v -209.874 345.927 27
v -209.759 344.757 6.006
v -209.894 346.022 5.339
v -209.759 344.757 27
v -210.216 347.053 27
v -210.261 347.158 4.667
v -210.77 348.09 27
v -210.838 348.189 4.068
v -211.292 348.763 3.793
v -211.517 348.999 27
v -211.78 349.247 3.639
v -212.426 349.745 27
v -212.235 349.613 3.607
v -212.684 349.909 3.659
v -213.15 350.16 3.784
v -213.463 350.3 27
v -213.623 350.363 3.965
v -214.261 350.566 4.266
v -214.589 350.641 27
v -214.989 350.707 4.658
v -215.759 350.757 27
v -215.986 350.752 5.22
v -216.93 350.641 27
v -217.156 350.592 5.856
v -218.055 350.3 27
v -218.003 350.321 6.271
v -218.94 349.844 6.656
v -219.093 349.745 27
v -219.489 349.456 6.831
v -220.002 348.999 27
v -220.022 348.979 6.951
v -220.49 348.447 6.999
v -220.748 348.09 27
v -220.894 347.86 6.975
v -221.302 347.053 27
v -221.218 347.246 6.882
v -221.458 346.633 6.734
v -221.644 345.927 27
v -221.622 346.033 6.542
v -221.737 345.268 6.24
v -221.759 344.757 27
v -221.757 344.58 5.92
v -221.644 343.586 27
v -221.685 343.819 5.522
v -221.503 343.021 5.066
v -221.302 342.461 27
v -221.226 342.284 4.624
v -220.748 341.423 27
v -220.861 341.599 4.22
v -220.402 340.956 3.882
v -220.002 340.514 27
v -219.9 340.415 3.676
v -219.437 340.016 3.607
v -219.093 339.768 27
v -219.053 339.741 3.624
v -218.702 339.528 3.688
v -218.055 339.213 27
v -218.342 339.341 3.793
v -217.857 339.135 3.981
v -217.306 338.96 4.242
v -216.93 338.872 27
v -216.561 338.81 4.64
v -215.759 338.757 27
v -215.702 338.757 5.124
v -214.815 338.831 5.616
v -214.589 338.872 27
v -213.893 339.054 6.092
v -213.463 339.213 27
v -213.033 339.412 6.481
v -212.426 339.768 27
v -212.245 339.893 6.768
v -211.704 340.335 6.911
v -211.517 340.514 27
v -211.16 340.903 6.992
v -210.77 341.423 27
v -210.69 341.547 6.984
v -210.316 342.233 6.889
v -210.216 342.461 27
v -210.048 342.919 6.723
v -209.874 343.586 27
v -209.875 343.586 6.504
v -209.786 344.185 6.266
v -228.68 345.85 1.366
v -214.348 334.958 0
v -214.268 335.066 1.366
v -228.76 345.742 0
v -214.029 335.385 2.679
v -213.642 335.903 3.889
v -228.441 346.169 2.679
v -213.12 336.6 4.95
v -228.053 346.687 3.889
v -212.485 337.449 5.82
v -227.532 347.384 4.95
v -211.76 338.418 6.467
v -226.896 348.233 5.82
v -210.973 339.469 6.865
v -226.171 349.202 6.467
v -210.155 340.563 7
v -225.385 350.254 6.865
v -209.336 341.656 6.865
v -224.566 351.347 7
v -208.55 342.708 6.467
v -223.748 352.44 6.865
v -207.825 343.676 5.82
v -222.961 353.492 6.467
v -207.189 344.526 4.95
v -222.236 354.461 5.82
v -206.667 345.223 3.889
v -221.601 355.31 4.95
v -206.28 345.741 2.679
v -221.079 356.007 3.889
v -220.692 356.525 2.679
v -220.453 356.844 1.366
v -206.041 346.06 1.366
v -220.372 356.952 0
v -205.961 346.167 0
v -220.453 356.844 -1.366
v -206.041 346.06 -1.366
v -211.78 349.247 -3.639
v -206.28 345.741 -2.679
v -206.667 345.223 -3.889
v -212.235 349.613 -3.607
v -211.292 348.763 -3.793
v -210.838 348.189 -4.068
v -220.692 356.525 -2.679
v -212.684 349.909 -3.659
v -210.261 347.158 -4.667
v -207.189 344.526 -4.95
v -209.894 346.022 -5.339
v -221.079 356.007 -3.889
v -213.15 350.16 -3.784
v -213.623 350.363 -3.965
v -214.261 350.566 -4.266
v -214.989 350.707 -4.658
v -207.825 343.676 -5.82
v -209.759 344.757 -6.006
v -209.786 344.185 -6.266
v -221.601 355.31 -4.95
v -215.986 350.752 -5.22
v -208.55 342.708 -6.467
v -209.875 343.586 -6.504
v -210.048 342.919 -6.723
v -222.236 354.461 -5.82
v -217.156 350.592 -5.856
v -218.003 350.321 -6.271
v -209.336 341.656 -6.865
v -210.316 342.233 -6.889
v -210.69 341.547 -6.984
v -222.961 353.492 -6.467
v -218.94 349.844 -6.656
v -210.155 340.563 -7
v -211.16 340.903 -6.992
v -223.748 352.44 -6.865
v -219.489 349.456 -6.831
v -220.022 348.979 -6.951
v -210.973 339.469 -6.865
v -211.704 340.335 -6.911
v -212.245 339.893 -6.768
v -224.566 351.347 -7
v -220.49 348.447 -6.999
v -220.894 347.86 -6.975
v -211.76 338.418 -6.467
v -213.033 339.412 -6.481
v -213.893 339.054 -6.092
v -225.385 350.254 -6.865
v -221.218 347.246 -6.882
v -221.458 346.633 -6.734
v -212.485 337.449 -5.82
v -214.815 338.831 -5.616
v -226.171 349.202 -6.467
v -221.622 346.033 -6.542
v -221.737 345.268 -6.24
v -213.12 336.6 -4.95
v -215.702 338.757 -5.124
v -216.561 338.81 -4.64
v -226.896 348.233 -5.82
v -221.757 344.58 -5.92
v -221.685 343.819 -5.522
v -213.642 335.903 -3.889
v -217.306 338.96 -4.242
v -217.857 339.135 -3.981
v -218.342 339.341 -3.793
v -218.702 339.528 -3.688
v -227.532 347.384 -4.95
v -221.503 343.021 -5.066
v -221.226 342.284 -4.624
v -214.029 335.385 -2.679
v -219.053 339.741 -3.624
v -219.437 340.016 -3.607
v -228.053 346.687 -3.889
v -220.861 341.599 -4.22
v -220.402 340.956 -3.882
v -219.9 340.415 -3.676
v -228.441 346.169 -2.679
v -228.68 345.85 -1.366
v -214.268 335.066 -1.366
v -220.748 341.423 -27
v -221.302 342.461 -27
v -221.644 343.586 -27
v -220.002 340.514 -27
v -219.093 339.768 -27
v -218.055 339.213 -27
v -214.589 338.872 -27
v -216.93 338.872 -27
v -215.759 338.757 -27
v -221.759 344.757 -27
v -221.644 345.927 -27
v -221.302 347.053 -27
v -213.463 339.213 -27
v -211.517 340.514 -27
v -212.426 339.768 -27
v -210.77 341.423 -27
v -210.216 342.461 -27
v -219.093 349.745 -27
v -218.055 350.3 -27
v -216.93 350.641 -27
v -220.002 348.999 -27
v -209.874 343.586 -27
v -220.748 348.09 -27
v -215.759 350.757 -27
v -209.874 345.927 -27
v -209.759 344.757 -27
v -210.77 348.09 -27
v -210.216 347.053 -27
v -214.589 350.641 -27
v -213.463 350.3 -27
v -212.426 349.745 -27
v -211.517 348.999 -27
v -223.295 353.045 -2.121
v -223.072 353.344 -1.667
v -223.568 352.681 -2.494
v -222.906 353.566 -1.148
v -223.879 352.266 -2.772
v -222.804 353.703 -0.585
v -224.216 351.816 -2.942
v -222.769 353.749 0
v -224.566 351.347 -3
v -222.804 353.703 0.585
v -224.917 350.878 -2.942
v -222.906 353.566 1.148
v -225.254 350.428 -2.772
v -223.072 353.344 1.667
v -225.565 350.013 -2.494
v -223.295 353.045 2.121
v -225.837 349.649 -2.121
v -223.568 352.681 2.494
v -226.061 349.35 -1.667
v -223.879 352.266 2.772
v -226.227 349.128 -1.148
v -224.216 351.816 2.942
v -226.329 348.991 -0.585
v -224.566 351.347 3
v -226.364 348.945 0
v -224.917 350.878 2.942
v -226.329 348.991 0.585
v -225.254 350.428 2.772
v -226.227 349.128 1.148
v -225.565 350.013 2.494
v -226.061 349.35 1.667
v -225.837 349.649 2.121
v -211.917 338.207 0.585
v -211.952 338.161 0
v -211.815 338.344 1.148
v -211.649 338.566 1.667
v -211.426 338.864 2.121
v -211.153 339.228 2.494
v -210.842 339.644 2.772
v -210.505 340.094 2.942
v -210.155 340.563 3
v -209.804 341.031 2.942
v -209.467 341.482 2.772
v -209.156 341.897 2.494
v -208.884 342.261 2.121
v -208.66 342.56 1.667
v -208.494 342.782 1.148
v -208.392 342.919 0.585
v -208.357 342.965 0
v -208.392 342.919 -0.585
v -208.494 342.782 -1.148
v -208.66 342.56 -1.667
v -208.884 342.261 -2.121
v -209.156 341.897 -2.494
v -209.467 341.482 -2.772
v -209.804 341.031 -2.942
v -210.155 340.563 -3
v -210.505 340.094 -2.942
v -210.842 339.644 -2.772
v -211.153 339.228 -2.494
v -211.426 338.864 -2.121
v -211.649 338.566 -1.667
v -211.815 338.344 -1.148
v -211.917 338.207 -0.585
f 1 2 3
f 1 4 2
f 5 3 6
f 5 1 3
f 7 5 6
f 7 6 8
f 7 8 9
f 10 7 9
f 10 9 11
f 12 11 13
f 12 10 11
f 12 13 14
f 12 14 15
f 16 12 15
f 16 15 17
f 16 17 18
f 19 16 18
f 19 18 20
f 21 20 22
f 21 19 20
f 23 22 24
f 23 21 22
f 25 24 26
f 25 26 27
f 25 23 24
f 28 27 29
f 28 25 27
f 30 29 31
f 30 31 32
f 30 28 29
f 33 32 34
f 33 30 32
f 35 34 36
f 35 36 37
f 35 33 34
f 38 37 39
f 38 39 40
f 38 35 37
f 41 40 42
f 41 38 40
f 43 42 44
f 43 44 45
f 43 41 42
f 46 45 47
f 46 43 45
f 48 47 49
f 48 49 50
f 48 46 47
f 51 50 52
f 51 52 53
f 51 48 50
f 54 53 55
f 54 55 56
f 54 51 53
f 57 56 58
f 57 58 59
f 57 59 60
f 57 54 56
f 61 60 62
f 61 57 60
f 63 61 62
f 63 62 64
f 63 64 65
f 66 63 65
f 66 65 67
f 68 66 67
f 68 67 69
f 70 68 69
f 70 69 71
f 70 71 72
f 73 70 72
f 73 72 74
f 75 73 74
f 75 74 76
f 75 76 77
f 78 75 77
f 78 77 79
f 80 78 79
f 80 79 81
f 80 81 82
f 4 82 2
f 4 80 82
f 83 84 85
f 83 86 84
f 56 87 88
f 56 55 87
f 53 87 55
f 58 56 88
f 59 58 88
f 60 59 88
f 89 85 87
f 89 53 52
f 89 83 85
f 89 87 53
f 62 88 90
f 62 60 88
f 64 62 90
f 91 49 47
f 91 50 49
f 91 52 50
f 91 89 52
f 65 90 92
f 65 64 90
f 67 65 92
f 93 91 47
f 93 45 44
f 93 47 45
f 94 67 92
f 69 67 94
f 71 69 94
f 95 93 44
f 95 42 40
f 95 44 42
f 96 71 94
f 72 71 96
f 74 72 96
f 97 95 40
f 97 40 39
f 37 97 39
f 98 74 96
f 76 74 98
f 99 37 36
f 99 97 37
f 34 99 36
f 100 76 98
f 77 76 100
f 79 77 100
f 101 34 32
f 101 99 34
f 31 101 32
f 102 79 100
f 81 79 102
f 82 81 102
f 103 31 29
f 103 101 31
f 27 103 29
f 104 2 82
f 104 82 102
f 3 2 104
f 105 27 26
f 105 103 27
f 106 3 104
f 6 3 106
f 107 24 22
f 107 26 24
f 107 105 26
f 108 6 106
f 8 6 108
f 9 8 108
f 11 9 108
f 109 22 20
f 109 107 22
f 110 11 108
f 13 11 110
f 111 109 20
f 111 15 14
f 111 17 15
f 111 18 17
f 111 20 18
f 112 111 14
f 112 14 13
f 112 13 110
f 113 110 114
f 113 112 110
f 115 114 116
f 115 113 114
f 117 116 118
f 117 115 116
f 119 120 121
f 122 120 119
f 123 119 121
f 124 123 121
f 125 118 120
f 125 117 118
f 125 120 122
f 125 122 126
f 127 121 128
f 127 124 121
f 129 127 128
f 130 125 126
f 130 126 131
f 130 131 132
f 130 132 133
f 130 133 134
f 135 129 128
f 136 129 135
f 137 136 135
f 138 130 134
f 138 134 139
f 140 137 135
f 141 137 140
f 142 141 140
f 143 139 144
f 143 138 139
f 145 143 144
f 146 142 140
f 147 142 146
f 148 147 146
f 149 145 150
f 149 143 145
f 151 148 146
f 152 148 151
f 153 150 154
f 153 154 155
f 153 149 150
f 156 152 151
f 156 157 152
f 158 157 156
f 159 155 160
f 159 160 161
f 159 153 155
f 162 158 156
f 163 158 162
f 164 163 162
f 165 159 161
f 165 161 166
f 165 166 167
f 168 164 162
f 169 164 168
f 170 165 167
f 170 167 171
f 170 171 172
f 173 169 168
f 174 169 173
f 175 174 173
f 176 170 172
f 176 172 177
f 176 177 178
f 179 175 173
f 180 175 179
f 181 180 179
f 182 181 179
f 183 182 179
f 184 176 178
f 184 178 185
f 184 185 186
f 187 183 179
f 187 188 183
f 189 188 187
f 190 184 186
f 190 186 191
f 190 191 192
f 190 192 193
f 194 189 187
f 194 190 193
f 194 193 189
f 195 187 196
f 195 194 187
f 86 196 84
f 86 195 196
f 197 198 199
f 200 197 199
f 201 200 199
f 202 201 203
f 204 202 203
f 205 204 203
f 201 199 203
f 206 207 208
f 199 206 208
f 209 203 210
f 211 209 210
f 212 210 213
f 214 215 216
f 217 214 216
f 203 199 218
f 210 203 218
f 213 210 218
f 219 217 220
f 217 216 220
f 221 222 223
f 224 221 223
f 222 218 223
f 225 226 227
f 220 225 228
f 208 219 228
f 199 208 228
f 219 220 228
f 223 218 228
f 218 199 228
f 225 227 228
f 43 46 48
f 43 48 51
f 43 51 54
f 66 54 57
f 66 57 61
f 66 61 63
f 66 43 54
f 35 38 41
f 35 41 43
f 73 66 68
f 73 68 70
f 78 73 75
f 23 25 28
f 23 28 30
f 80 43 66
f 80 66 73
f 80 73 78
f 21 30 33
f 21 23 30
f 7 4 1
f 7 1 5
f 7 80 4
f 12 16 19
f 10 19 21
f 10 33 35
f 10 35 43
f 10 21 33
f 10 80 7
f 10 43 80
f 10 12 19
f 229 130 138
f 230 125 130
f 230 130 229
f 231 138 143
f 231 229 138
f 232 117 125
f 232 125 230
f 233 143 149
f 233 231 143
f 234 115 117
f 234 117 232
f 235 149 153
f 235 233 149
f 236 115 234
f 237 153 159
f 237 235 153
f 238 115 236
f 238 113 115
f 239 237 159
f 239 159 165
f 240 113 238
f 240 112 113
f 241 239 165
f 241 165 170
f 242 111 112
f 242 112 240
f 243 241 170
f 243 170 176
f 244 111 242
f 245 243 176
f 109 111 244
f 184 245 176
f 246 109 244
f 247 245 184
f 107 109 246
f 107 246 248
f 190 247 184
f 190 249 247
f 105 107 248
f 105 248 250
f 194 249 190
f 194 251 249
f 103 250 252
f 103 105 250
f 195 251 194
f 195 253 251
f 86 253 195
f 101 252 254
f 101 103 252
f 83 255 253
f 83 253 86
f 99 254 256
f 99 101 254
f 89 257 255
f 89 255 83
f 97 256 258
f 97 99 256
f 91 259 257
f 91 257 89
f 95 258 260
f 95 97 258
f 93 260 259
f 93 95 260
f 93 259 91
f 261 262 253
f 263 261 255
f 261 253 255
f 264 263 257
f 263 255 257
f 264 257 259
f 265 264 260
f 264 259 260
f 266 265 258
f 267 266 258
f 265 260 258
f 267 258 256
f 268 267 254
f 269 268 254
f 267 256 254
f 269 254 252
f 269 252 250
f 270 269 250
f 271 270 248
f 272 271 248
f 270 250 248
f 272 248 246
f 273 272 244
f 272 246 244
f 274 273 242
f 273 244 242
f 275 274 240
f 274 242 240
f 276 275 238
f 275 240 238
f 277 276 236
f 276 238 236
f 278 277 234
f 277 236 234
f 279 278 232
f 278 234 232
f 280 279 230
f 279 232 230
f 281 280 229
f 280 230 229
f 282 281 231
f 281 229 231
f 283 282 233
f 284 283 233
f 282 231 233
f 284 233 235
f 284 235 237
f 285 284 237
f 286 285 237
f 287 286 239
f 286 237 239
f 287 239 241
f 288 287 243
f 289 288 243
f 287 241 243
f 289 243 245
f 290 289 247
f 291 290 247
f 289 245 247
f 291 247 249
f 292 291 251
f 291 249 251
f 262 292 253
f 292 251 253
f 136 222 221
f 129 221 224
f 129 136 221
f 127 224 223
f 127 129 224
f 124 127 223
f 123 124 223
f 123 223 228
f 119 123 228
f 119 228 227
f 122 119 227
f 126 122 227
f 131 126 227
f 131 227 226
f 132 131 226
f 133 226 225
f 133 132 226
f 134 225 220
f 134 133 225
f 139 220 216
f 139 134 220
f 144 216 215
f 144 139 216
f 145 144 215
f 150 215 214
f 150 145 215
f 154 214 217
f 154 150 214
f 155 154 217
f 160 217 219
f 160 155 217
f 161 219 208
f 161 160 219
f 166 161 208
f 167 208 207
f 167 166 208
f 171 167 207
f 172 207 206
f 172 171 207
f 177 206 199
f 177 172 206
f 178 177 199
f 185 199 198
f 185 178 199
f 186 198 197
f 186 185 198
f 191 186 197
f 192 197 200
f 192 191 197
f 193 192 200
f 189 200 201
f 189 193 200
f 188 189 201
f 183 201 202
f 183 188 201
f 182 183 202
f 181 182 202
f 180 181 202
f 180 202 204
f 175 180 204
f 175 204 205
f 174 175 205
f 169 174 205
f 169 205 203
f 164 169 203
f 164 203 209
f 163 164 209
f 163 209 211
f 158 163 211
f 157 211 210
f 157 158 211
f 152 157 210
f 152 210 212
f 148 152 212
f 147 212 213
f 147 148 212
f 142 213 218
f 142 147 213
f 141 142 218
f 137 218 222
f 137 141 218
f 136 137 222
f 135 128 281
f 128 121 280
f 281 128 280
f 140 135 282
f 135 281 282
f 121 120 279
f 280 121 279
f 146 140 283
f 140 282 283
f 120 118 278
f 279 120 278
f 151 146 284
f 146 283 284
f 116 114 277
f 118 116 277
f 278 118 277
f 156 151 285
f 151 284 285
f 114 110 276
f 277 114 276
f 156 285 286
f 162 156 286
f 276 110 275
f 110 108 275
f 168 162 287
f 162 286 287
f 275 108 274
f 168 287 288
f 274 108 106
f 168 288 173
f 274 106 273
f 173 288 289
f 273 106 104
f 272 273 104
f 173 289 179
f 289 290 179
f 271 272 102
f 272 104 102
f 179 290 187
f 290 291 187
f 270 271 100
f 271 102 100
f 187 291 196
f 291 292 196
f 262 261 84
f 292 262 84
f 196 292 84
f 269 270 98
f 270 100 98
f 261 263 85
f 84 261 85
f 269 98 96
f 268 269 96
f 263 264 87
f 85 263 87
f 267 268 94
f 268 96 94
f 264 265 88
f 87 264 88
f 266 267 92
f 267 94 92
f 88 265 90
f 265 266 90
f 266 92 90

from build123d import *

# Parameters (mm, degrees)
PUENTE_PROFILE_R           = 6
BOSS_TORNILLO_PROFILE_R    = 7
TALADRO_TORNILLO_PROFILE_R = 3


with BuildPart() as part:
    # Puente: sweep along a curve in space
    with BuildLine() as puente_path:
        Line((-215.759160386, 344.756610234, -27), (-215.759160386, 344.756610234, 27))
    # Puente profile (on start of the path) → Puente (sweep)
    with BuildSketch(Plane(origin=(-215.759160386, 344.756610234, -27), x_dir=(1, 0, 0), z_dir=(0, 0, 1))):
        Circle(PUENTE_PROFILE_R)
    sweep(path=puente_path.line)

    # Boss_tornillo: sweep along a curve in space
    with BuildLine() as boss_tornillo_path:
        Line((-210.15458046, 340.562723747, 0), (-224.566357411, 351.347003284, 0))
    # Boss_tornillo profile (on start of the path) → Boss_tornillo (sweep)
    with BuildSketch(Plane(origin=(-210.15458046, 340.562723747, 0), x_dir=(-0.5991266409502979, -0.8006542750173841, 0), z_dir=(-0.8006542750173841, 0.5991266409502979, 0))):
        Circle(BOSS_TORNILLO_PROFILE_R)
    sweep(path=boss_tornillo_path.line)

    # Taladro_tornillo: sweep along a curve in space
    with BuildLine() as taladro_tornillo_path:
        Line((-209.353926185, 339.963597106, 0), (-225.367011686, 351.946129925, 0))
    # Taladro_tornillo profile (on start of the path) → Taladro_tornillo (sweep, cut)
    with BuildSketch(Plane(origin=(-209.353926185, 339.963597106, 0), x_dir=(-0.5991266409502969, -0.8006542750173848, 0), z_dir=(-0.8006542750173848, 0.5991266409502969, 0))):
        Circle(TALADRO_TORNILLO_PROFILE_R)
    sweep(path=taladro_tornillo_path.line, mode=Mode.SUBTRACT)


solid = part.part
